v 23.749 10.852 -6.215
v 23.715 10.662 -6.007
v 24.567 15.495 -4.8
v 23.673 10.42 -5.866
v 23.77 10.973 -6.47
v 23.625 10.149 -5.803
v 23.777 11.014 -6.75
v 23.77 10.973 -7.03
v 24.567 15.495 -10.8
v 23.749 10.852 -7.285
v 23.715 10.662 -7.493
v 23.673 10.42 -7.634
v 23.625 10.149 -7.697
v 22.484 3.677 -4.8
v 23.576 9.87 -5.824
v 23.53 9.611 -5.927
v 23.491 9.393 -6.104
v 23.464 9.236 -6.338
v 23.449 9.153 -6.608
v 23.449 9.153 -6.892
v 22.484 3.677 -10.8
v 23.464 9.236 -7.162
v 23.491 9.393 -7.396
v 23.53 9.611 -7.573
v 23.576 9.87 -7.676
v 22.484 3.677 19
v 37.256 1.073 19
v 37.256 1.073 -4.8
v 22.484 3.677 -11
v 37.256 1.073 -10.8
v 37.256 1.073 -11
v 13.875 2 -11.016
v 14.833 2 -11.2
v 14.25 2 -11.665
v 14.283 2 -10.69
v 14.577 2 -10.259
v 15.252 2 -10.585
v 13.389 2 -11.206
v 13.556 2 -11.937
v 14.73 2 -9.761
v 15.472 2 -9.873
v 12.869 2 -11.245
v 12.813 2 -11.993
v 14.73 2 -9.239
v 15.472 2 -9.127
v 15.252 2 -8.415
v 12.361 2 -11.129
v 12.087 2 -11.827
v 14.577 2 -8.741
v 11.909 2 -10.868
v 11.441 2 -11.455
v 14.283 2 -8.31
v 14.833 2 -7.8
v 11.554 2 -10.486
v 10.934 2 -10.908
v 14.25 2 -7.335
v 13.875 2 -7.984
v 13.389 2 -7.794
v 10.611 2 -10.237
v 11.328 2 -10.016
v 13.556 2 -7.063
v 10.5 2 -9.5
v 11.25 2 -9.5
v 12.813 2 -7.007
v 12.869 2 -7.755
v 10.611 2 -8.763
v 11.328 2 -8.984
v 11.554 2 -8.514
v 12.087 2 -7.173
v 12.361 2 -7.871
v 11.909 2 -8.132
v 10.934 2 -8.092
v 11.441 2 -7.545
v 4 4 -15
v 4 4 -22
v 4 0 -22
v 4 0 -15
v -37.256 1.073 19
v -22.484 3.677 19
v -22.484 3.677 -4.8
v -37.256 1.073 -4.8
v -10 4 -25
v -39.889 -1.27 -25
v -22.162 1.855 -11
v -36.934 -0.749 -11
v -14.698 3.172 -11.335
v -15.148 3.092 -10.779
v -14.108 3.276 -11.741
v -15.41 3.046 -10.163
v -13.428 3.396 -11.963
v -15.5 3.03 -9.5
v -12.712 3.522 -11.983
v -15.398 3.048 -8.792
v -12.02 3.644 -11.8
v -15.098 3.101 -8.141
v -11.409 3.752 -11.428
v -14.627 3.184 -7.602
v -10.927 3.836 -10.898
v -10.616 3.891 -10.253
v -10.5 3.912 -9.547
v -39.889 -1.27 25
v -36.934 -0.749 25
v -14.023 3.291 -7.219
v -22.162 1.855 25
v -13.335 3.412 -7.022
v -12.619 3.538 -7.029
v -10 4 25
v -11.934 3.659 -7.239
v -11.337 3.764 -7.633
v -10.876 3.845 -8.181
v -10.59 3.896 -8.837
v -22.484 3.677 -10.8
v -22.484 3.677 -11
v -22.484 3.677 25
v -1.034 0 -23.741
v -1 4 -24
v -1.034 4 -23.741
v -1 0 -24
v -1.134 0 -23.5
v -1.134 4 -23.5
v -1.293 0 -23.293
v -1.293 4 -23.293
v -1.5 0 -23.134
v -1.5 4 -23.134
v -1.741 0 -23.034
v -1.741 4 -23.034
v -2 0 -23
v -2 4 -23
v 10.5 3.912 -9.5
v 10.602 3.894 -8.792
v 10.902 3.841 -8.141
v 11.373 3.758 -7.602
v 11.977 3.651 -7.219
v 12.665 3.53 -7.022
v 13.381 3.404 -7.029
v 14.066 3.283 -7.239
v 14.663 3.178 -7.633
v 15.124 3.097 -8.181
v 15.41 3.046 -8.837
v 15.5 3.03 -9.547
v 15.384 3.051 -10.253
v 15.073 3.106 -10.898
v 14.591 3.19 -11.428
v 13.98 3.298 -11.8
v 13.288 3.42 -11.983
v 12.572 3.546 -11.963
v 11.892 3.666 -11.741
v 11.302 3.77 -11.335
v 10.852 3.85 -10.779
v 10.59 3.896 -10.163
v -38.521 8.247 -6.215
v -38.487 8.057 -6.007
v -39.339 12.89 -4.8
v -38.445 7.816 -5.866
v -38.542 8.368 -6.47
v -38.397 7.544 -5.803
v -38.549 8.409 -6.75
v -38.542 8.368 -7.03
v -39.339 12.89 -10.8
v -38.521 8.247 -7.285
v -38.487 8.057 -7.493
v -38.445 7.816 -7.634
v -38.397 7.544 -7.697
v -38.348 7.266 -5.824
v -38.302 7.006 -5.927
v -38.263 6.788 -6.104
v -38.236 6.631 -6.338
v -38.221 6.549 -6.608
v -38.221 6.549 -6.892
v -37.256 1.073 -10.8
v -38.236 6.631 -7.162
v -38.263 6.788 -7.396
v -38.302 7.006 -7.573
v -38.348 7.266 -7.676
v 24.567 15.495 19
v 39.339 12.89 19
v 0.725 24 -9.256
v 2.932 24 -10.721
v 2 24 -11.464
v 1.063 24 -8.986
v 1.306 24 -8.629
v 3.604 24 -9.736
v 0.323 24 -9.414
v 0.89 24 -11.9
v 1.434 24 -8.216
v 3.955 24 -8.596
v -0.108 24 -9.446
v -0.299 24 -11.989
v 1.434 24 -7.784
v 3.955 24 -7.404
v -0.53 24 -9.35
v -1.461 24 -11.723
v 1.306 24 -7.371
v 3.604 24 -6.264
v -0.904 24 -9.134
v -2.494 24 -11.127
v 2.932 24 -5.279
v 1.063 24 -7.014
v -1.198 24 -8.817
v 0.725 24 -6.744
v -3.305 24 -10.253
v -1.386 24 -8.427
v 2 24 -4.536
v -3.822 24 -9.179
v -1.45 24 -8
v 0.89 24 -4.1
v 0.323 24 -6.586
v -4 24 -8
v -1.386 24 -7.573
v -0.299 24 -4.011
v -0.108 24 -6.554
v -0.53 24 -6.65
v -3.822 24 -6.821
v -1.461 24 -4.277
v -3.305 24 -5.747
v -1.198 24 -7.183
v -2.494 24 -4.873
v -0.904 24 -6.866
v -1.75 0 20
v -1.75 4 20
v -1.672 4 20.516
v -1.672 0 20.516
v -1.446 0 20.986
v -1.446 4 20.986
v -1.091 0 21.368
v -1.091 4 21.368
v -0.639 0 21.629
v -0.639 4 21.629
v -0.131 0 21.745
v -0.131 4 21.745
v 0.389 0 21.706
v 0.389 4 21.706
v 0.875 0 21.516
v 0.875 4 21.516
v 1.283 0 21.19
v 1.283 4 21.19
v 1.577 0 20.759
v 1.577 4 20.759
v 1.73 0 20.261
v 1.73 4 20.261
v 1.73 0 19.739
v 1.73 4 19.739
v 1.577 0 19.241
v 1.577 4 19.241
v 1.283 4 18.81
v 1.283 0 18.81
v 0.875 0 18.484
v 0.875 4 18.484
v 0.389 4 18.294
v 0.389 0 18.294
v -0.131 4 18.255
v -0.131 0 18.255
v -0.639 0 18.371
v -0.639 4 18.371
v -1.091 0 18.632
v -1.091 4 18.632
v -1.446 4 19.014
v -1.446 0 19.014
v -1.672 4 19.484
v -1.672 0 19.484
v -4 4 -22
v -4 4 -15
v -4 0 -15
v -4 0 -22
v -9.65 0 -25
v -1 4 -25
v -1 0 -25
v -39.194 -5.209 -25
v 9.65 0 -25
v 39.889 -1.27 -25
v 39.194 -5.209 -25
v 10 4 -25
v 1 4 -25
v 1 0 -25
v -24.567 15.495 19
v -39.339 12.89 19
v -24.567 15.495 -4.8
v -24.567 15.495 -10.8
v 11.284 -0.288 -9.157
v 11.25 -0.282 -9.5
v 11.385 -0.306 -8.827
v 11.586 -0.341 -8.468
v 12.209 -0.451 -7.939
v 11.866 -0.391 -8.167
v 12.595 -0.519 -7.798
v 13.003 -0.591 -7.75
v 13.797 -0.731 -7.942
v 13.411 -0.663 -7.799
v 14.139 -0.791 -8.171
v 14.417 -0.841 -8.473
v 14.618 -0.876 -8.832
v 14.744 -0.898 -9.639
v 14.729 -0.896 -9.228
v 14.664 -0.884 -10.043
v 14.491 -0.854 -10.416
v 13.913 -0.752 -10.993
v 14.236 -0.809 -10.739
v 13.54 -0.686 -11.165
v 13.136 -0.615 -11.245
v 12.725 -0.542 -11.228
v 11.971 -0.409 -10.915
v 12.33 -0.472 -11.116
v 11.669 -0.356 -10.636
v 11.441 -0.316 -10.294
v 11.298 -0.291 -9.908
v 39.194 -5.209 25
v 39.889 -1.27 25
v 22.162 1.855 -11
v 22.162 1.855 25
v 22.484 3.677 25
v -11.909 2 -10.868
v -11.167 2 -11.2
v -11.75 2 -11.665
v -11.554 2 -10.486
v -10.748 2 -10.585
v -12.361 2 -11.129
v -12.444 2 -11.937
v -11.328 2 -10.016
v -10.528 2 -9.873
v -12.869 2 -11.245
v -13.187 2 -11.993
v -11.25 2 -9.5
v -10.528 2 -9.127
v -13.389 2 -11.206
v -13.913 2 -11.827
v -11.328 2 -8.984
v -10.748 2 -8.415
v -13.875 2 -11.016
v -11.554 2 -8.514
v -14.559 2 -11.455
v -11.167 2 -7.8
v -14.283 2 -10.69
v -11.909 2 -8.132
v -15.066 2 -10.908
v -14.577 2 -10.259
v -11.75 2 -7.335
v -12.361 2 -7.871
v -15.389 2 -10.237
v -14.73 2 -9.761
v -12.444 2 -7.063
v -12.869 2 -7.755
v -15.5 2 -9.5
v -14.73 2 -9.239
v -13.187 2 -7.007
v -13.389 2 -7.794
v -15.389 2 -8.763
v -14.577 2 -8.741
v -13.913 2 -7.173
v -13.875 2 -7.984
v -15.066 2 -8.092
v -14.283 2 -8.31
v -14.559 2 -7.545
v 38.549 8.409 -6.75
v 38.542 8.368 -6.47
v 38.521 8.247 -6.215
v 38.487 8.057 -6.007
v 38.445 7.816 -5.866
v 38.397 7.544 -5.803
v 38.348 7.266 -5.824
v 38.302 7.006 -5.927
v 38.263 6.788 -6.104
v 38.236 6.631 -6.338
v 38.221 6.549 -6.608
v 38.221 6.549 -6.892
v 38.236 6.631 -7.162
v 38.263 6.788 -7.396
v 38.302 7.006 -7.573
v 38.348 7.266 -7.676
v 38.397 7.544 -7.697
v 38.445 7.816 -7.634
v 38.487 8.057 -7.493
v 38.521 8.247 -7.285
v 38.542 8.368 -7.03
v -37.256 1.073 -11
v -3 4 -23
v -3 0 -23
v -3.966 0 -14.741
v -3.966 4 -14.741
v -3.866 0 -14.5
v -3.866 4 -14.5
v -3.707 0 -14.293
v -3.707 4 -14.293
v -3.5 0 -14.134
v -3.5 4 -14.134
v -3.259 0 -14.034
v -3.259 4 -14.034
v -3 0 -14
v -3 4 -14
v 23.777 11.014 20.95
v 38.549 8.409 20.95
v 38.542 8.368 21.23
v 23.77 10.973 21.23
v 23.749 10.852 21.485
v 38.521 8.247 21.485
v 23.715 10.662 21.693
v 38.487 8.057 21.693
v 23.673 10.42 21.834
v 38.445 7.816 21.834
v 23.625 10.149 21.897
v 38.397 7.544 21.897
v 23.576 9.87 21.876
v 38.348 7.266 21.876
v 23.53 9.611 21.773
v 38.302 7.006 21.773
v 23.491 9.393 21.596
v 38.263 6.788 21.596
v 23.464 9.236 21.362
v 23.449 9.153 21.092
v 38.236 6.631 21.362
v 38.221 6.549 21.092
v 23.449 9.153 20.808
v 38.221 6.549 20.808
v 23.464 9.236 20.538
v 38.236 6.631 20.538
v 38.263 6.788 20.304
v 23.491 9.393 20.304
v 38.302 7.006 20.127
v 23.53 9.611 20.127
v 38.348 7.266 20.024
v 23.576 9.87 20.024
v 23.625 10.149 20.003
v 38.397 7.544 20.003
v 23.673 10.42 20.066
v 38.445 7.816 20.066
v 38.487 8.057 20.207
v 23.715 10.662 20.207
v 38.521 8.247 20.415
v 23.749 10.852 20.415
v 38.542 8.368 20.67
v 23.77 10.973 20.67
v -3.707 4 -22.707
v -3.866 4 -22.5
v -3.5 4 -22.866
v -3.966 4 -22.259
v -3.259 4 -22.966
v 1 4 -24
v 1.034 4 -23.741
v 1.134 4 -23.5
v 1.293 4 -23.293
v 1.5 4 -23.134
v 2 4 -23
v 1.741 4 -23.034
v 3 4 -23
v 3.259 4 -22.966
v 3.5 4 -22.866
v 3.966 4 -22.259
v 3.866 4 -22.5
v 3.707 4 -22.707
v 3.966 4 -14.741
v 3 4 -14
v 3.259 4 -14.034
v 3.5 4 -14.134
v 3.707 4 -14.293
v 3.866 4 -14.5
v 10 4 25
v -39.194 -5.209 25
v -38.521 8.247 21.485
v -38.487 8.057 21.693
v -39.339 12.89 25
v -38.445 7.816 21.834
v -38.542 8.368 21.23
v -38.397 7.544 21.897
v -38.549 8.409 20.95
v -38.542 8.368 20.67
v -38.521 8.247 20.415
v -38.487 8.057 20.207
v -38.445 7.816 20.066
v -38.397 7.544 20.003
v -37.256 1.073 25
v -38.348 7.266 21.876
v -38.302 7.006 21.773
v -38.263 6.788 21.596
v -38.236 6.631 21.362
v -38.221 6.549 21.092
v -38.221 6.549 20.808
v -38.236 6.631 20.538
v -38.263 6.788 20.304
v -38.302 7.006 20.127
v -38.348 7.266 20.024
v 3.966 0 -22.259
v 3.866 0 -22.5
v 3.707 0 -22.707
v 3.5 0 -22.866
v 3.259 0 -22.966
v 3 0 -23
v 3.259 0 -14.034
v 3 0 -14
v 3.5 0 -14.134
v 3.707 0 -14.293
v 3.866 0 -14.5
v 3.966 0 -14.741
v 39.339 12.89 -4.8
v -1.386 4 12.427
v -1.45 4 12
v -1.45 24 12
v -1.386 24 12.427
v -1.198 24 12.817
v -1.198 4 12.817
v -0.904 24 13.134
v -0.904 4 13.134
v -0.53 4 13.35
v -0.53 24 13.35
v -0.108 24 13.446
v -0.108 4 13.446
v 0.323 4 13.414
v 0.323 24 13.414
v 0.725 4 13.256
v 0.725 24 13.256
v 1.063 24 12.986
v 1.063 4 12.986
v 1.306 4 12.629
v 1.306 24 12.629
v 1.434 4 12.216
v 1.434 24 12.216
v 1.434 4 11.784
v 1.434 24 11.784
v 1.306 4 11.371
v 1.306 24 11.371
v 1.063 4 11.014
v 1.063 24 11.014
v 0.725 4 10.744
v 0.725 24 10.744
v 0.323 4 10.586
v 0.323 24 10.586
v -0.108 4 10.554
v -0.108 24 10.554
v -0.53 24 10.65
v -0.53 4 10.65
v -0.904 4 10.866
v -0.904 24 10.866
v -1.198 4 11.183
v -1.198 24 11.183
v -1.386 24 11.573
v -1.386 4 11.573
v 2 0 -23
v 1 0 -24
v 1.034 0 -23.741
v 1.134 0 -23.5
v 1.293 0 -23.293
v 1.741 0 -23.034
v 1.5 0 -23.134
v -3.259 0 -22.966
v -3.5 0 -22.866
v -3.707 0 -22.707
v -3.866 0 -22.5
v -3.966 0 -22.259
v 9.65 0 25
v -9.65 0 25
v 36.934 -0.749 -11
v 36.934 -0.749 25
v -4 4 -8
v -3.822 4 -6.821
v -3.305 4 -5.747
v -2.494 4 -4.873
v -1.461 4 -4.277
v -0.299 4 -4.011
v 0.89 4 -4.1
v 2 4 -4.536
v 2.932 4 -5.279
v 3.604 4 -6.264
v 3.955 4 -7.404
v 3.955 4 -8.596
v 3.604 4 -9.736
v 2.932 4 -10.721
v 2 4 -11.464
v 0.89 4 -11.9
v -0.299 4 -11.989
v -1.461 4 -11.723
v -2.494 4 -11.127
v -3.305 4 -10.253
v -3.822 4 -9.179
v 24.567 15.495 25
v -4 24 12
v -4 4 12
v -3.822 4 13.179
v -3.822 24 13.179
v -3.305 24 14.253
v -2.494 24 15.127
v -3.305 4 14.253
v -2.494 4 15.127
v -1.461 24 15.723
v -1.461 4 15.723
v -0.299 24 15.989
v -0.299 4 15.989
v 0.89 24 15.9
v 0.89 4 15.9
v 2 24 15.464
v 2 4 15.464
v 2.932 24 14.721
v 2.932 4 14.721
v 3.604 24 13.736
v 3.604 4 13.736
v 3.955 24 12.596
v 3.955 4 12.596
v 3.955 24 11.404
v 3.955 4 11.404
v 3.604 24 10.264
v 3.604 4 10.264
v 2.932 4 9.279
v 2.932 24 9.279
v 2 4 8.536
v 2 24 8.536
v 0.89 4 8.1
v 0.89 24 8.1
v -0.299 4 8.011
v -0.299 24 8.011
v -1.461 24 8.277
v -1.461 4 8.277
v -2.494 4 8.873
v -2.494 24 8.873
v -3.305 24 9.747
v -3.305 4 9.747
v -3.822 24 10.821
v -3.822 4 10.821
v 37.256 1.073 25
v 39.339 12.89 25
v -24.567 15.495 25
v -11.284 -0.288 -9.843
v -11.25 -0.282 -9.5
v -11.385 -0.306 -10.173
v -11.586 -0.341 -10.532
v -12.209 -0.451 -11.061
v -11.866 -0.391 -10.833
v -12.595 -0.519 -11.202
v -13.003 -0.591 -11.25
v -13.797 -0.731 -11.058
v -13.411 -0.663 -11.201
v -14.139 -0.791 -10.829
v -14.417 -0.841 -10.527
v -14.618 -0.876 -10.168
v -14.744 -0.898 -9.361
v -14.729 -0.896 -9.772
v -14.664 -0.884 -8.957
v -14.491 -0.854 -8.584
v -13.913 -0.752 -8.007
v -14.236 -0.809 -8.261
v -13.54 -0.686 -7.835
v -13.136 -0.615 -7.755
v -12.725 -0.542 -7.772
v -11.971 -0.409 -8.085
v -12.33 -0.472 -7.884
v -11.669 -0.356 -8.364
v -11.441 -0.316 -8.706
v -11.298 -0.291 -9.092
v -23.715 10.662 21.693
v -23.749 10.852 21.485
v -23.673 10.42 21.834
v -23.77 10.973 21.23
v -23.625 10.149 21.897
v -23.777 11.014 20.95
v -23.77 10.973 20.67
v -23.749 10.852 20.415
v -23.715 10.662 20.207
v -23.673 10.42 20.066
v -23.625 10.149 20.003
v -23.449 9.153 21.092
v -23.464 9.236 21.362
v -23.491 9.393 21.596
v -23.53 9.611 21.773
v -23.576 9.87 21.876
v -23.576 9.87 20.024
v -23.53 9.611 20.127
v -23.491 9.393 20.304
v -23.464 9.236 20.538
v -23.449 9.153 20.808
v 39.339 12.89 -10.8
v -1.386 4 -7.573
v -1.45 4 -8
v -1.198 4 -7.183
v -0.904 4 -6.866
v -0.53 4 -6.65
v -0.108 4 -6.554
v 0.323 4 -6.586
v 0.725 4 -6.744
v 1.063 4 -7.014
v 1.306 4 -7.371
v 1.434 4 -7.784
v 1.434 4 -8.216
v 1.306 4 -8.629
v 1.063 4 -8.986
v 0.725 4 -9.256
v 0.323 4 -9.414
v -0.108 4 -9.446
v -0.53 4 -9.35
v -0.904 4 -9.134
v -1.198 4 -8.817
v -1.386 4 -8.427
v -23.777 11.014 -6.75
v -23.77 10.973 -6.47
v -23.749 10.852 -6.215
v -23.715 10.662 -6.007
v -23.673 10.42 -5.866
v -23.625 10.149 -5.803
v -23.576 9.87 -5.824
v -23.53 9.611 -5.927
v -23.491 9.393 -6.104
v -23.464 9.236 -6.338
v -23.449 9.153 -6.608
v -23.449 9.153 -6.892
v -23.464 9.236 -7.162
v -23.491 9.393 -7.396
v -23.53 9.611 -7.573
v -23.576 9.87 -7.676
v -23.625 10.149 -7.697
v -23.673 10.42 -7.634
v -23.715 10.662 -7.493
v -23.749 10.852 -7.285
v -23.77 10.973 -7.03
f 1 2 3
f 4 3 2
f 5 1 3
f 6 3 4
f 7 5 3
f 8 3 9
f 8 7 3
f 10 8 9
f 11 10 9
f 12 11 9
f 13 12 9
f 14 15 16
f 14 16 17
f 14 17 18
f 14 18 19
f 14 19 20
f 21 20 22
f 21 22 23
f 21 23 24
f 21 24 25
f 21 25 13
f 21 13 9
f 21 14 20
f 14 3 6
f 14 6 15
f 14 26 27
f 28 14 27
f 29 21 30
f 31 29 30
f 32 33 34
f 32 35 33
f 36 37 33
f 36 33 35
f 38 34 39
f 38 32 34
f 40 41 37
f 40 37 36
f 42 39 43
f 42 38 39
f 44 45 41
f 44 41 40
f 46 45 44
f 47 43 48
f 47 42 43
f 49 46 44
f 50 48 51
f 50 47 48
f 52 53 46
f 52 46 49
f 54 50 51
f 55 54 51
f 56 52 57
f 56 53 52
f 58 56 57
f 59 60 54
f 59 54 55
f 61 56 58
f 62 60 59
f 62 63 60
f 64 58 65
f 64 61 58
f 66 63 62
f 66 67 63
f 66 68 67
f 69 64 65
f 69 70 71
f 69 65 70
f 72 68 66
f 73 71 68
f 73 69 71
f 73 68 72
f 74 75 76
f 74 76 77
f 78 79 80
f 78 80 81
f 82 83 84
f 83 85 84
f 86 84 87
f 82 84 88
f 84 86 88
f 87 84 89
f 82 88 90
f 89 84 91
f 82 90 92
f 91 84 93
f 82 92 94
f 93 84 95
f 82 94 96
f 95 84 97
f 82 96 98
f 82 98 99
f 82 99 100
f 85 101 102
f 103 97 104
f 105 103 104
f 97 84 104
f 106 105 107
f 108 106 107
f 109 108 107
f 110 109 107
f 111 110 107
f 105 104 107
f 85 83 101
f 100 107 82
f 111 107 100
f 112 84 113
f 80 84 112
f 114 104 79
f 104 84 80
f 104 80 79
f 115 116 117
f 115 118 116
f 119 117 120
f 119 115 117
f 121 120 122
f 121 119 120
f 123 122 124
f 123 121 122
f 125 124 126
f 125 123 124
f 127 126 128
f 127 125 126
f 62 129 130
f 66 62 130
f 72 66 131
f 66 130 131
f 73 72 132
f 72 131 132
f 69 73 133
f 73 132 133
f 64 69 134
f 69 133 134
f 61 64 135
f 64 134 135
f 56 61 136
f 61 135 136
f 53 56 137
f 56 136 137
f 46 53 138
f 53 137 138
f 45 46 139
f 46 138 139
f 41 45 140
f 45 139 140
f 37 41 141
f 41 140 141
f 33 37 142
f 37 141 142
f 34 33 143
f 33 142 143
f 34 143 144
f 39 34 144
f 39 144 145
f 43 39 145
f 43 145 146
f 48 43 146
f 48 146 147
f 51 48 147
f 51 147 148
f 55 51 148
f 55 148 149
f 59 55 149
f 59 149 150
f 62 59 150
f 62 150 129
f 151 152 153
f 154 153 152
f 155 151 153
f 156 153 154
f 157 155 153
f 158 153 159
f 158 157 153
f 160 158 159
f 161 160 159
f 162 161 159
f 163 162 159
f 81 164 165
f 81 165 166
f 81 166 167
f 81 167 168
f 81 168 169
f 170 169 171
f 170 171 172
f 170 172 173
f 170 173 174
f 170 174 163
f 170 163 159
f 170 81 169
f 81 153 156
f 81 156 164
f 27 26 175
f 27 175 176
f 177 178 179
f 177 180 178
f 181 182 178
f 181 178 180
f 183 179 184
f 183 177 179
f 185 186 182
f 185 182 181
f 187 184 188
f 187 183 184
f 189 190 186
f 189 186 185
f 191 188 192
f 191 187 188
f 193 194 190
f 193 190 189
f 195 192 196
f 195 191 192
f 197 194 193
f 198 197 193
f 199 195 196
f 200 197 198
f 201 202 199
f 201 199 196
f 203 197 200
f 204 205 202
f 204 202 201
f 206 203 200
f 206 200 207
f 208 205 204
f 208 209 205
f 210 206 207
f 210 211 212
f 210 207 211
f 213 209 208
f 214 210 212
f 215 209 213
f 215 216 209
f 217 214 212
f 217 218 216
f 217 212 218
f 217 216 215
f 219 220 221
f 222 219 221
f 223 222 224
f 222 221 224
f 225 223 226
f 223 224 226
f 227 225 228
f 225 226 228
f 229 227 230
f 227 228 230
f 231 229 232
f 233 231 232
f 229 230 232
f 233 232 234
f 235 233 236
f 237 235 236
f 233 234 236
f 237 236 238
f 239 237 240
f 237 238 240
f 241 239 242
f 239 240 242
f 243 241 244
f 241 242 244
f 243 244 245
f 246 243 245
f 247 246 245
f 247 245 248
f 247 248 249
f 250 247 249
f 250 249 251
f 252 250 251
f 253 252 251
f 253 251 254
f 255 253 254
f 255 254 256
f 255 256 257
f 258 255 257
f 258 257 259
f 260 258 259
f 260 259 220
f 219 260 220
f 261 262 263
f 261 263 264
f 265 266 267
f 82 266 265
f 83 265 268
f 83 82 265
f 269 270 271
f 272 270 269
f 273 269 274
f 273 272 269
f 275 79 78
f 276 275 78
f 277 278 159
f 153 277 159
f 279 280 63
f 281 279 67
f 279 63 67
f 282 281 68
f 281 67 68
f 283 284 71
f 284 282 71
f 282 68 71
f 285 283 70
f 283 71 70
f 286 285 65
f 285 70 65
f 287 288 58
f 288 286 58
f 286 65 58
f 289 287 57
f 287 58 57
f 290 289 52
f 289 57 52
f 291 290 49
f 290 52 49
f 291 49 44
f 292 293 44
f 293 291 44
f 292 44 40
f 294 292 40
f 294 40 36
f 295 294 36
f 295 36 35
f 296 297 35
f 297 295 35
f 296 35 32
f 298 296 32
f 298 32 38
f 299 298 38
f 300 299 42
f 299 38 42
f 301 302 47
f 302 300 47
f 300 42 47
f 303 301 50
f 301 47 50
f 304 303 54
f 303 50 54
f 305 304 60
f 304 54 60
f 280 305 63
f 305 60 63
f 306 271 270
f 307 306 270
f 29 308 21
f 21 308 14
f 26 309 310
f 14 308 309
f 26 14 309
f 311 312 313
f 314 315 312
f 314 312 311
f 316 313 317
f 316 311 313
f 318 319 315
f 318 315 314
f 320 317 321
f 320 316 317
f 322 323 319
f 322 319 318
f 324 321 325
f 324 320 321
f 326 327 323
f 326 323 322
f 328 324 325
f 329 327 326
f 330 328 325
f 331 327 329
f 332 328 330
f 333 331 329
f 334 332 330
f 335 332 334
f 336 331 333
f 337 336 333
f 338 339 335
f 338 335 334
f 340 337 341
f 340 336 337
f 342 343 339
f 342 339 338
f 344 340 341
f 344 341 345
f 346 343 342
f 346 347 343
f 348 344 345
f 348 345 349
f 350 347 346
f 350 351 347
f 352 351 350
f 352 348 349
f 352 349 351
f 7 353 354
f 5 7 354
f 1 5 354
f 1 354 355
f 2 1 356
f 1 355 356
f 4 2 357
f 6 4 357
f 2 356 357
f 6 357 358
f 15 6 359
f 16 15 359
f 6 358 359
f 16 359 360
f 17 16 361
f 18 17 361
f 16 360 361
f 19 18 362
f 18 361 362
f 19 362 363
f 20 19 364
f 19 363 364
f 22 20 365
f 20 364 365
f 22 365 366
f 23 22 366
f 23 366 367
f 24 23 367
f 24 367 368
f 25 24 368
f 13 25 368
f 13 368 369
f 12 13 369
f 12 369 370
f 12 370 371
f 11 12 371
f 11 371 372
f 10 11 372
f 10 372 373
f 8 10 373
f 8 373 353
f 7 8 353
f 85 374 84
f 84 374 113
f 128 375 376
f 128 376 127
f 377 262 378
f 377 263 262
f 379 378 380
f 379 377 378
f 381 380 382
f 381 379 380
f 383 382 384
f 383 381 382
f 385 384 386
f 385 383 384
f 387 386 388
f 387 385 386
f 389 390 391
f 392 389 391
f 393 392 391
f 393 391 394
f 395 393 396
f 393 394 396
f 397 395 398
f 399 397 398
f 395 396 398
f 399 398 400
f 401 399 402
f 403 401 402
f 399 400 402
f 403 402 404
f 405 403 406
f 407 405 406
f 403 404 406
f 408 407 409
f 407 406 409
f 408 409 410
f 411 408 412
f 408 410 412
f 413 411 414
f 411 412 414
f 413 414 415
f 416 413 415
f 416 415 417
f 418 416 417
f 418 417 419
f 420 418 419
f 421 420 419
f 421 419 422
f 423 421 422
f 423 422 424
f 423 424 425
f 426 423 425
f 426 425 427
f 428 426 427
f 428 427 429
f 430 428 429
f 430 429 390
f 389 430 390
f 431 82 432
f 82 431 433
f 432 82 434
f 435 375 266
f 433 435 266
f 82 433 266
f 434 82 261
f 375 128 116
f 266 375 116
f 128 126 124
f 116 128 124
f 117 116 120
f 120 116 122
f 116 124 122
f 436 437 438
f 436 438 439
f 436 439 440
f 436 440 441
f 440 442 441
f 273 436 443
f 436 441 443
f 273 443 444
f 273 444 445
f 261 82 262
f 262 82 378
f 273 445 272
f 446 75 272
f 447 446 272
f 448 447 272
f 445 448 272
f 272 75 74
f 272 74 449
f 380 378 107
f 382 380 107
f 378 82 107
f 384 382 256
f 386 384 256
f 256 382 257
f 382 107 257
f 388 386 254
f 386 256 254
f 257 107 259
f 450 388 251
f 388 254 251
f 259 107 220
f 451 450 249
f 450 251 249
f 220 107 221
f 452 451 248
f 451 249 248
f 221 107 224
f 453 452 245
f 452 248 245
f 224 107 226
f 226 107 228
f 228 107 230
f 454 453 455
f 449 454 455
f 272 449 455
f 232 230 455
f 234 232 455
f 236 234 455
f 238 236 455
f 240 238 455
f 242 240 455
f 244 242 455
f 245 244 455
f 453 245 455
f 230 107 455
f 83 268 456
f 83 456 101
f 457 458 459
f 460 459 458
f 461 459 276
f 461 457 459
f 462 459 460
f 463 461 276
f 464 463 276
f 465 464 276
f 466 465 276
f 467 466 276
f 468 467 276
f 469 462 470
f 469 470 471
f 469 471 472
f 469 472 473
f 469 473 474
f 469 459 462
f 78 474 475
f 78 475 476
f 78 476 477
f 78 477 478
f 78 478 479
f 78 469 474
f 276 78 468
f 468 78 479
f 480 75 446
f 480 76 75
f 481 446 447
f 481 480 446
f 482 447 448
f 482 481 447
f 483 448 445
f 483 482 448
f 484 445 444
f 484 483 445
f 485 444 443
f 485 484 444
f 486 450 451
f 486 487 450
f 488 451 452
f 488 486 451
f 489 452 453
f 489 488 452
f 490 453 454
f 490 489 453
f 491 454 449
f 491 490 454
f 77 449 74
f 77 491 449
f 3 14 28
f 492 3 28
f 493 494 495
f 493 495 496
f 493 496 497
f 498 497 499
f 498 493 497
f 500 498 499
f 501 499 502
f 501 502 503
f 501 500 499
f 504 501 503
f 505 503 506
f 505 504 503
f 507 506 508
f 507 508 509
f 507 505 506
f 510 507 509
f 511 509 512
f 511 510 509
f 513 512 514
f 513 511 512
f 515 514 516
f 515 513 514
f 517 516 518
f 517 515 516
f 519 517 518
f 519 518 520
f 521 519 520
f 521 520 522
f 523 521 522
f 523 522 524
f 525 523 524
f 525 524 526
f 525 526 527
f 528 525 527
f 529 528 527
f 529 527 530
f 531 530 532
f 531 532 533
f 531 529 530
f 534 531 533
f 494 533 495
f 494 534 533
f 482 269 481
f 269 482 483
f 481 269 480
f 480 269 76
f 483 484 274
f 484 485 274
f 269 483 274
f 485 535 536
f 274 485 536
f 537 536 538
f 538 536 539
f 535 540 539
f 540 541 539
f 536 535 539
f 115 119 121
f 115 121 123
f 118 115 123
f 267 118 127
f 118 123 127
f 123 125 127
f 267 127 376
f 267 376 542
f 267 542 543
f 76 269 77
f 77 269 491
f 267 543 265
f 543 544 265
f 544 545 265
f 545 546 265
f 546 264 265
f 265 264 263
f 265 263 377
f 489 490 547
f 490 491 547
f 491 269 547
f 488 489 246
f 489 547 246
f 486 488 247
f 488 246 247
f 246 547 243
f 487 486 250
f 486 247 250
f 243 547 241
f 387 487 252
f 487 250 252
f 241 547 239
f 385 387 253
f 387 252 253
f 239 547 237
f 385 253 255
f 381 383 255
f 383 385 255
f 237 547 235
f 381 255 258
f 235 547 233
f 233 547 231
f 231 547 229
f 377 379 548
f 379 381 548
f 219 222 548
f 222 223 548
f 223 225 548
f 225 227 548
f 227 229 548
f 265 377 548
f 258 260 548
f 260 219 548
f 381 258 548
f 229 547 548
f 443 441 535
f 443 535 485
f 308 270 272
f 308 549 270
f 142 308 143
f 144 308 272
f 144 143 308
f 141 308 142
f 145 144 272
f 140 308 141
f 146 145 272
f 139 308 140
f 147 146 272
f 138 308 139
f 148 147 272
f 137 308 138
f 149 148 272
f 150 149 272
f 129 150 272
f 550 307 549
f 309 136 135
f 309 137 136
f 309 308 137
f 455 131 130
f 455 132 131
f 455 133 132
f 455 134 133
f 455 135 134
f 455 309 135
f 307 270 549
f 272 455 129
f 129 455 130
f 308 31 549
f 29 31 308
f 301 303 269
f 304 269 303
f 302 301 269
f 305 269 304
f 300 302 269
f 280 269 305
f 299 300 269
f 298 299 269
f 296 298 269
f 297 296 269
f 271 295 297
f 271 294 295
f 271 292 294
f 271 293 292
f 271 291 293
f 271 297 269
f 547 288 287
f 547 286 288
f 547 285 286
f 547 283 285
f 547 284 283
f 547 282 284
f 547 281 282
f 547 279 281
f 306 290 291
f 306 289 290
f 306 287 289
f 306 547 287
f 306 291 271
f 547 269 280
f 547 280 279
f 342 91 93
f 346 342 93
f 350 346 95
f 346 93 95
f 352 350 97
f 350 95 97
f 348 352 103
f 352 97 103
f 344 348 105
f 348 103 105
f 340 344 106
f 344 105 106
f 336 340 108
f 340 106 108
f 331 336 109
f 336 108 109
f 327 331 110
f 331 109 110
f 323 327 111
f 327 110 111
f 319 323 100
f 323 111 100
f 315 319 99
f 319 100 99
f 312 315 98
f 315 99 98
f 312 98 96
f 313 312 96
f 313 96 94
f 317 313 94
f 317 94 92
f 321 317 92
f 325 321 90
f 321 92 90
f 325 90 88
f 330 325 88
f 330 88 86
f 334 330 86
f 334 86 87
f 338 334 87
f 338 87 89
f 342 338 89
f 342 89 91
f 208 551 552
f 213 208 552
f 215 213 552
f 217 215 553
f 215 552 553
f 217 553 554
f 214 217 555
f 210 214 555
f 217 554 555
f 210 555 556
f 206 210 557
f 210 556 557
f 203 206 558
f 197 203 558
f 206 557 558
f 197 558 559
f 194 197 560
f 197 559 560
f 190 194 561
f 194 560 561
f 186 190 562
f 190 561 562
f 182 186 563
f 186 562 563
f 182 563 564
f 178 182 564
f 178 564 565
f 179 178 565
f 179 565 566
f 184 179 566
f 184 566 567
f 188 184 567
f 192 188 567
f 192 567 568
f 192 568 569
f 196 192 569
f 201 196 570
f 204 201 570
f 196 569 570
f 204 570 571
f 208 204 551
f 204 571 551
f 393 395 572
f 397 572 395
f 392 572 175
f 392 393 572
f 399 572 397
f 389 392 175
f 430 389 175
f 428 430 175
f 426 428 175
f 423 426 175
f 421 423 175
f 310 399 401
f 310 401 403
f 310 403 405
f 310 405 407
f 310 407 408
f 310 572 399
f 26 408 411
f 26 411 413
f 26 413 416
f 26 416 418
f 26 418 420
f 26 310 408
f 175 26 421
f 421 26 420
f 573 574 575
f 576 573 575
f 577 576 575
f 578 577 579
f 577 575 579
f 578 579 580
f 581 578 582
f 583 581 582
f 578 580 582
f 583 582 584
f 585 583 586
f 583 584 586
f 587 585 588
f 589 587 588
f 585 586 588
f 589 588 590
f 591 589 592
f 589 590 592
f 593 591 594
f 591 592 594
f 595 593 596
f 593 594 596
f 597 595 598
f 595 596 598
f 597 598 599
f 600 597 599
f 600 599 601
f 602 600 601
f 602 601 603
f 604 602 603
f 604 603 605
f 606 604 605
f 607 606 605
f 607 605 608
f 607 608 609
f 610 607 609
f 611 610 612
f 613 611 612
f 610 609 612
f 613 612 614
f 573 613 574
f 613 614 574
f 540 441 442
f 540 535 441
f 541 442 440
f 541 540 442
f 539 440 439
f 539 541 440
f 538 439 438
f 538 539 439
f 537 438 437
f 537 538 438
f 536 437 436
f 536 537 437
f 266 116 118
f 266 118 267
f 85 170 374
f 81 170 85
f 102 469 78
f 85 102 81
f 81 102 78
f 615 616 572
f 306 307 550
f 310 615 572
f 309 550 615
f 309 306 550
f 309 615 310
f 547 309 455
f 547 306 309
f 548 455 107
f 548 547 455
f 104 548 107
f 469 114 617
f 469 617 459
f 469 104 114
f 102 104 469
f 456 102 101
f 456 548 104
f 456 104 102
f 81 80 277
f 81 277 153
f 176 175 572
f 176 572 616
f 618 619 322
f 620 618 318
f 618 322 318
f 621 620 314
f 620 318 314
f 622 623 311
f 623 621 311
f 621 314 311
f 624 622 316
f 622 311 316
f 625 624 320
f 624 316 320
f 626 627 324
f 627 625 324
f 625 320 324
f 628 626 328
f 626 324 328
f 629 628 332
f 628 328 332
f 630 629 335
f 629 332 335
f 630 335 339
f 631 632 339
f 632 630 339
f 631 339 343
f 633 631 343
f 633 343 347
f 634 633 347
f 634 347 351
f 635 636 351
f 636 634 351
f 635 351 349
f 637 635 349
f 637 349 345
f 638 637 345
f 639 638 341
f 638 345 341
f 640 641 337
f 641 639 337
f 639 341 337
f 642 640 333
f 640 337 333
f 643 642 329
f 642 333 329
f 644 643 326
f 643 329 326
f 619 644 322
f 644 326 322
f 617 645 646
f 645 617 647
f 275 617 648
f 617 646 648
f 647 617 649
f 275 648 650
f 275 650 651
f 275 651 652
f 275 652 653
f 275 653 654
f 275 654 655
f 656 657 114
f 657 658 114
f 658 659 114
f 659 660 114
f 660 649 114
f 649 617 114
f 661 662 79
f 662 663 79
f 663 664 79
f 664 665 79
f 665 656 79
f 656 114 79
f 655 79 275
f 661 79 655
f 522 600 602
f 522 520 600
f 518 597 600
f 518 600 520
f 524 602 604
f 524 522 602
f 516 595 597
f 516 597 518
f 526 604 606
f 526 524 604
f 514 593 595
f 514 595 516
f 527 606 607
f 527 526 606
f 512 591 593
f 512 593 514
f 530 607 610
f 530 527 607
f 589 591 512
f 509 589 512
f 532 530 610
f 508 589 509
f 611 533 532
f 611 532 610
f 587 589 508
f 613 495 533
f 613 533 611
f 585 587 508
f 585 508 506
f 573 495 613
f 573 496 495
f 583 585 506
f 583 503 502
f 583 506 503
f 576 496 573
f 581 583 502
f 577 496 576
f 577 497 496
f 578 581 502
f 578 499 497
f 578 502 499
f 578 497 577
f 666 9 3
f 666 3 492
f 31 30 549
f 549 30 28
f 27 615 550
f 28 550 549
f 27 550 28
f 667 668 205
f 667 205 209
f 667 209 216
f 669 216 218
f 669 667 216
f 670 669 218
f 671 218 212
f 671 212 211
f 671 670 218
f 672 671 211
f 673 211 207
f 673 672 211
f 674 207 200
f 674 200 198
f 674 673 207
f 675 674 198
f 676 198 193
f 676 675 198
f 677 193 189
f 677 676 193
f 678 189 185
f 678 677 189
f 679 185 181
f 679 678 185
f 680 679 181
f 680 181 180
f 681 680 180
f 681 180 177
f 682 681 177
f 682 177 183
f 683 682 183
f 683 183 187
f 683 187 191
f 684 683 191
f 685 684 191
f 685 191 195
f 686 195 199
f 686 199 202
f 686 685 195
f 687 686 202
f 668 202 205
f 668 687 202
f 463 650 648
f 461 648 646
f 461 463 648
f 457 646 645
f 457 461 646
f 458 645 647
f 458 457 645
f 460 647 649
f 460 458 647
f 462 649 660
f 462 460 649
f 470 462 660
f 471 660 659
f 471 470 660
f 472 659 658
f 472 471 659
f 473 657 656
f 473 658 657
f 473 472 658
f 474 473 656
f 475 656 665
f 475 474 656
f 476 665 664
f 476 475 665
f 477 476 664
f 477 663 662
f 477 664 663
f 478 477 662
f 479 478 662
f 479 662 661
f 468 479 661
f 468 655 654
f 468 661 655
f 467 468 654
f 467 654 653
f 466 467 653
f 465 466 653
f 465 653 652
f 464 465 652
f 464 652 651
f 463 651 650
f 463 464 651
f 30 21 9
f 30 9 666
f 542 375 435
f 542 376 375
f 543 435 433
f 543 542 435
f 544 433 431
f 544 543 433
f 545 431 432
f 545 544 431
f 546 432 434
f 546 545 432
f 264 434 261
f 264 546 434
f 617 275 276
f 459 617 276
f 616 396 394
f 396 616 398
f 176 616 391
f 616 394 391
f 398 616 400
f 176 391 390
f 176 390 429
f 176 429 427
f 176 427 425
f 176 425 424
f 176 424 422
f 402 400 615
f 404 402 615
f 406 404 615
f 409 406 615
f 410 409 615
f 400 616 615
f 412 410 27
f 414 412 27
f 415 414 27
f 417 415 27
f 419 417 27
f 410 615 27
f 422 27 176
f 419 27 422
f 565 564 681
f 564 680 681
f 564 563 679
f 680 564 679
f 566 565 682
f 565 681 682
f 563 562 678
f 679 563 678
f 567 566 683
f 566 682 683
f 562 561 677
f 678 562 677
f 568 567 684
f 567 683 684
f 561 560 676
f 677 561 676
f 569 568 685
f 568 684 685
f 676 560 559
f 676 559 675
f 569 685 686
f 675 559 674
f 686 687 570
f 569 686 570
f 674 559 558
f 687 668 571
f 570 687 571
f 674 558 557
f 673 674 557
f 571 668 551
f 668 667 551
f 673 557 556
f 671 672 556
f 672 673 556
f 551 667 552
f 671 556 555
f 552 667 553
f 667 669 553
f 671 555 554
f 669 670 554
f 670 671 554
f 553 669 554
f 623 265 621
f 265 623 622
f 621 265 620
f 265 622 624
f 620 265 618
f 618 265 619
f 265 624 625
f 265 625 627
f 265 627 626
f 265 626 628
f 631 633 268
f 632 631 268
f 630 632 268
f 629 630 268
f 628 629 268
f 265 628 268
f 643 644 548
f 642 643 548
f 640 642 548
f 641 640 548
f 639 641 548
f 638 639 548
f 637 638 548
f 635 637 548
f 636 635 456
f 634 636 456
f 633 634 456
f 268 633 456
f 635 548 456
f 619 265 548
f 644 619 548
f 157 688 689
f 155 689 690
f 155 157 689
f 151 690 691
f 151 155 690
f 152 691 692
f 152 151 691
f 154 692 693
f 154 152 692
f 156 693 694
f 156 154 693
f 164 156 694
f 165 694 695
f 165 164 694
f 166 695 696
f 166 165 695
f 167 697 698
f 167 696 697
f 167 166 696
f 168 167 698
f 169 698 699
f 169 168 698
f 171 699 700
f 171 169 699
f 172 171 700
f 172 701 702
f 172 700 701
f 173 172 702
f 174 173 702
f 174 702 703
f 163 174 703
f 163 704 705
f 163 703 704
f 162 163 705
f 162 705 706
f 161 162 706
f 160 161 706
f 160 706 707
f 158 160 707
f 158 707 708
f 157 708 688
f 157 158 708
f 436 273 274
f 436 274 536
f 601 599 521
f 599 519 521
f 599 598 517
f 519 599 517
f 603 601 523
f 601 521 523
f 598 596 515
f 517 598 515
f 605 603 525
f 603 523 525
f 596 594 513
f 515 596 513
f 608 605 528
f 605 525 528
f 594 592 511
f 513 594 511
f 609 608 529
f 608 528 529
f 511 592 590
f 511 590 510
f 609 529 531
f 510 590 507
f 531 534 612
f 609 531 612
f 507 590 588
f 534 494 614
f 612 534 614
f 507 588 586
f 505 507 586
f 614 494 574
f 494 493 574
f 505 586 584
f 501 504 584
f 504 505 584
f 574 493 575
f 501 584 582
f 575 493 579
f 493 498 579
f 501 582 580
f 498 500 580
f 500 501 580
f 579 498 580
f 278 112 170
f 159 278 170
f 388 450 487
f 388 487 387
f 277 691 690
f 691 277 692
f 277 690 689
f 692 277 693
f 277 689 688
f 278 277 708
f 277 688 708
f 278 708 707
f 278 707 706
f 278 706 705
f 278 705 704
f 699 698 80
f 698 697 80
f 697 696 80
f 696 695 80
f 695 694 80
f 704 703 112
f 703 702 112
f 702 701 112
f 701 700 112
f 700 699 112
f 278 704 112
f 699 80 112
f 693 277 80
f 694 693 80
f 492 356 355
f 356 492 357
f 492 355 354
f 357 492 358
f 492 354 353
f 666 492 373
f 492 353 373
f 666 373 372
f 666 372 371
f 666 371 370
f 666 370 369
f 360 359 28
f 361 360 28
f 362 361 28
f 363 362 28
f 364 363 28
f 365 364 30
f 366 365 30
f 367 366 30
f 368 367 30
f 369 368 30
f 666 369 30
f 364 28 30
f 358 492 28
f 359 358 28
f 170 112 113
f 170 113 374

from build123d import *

# Parameters (mm, degrees)
EXTRUDE_1_DEPTH     = 25
EXTRUDE_2_DEPTH     = 36
SKETCH_3_W          = 15
SKETCH_3_H          = 6
EXTRUDE_3_DEPTH     = 12
SKETCH_4_R          = 0.95
CUT_EXTRUDE_1_DEPTH = 21
SKETCH_5_R          = 4
SKETCH_5_R_2        = 1.45
EXTRUDE_4_DEPTH     = 20
EXTRUDE_4_2_DEPTH   = 20
SKETCH_6_R          = 1.75
CUT_EXTRUDE_2_DEPTH = 20
SKETCH_7_R          = 2.5
CUT_EXTRUDE_3_DEPTH = 2
CUT_EXTRUDE_4_DEPTH = 52.148040055
FILLET_4_R          = 1


with BuildPart() as part:
    # 草图1 → 凸台-拉伸1 (new, symmetric)
    with BuildSketch(Plane.XY):
        Polygon((0, 0), (9.650045346, 0), (39.194277936, -5.20944533), (39.888870647, -1.270214318), (10, 4), (0, 4), align=None)
    extrude_1 = extrude(amount=EXTRUDE_1_DEPTH, both=True)

    # 草图2 → 凸台-拉伸2 (add)
    with BuildSketch(Plane.XY.offset(25)):
        Polygon((22.162331093, 1.85545288), (22.483580221, 3.677347223), (37.255696517, 1.072624558), (36.934447388, -0.749269785), align=None)
    extrude_2 = extrude(amount=-EXTRUDE_2_DEPTH)

    # 草图3 → 凸台-拉伸3 (add)
    with BuildSketch(Plane(origin=(1.306826311, 7.411380301, 0), x_dir=(0.9848077530122079, -0.1736481776669312, 0), z_dir=(0.1736481776669312, 0.9848077530122079, 0))):
        with Locations((29.003439474, -22)):
            Rectangle(SKETCH_3_W, SKETCH_3_H)
        with Locations((29.003439474, 7.8)):
            Rectangle(SKETCH_3_W, SKETCH_3_H)
    extrude_3 = extrude(amount=EXTRUDE_3_DEPTH)

    # 草图4 → 切除-拉伸1 (cut)
    with BuildSketch(Plane(origin=(35.948870205, -6.338755743, 0), x_dir=(0, 0, -1), z_dir=(0.9848077530122081, -0.17364817766693072, 0))):
        with Locations(Location((-20.95, 14.025712789, 0), (0, 0, 90))):
            Circle(SKETCH_4_R)
        with Locations(Location((6.75, 14.025712789, 0), (0, 0, 90))):
            Circle(SKETCH_4_R)
    cut_extrude_1 = extrude(amount=-CUT_EXTRUDE_1_DEPTH, mode=Mode.SUBTRACT)

    # 镜向1: 凸台-拉伸1, 凸台-拉伸2, 凸台-拉伸3, 切除-拉伸1 across plane
    add(extrude_1.mirror(Plane(origin=(0, 0, 0), x_dir=(0, 0, 1), z_dir=(1, 0, 0))))
    add(extrude_2.mirror(Plane(origin=(0, 0, 0), x_dir=(0, 0, 1), z_dir=(1, 0, 0))))
    add(extrude_3.mirror(Plane(origin=(0, 0, 0), x_dir=(0, 0, 1), z_dir=(1, 0, 0))))
    add(cut_extrude_1.mirror(Plane(origin=(0, 0, 0), x_dir=(0, 0, 1), z_dir=(1, 0, 0))), mode=Mode.SUBTRACT)

    # 草图6 → 切除-拉伸2 (cut)
    with BuildSketch(Plane(origin=(0, 4, 0), x_dir=(1, 0, 0), z_dir=(0, 1, 0))):
        with Locations(Location((0, -20, 0), (0, 0, 180))):
            Circle(SKETCH_6_R)
        with Locations((-13, 9.5)):
            Circle(SKETCH_6_R)
        with Locations(Location((13, 9.5, 0), (0, 0, 180))):
            Circle(SKETCH_6_R)
    extrude(amount=-CUT_EXTRUDE_2_DEPTH, mode=Mode.SUBTRACT)

    # 草图7 → 切除-拉伸3 (cut)
    with BuildSketch(Plane(origin=(0, 4, 0), x_dir=(1, 0, 0), z_dir=(0, 1, 0))):
        with Locations(Location((-13, 9.5, 0), (0, 0, 180))):
            Circle(SKETCH_7_R)
        with Locations(Location((13, 9.5, 0), (0, 0, 180))):
            Circle(SKETCH_7_R)
    extrude(amount=-CUT_EXTRUDE_3_DEPTH, mode=Mode.SUBTRACT)

    # 草图8 → 切除-拉伸4 (cut, through all)
    with BuildSketch(Plane(origin=(0, 4, 0), x_dir=(1, 0, 0), z_dir=(0, 1, 0))):
        Polygon((-4, 23), (-1, 23), (-1, 25), (1, 25), (1, 23), (4, 23), (4, 14), (-4, 14), align=None)
    extrude(amount=-CUT_EXTRUDE_4_DEPTH, mode=Mode.SUBTRACT)

    # 圆角4
    fillet_4_edges = [part.edges().sort_by_distance(p)[0] for p in [
        (4, 2, -23),
        (4, 2, -14),
        (-4, 2, -14),
        (-4, 2, -23),
        (1, 2, -23),
        (-1, 2, -23),
    ]]
    fillet(fillet_4_edges, radius=FILLET_4_R)


with BuildPart() as body_2:
    # 草图5 → 凸台-拉伸4 (new body)
    with BuildSketch(Plane(origin=(0, 4, 0), x_dir=(1, 0, 0), z_dir=(0, 1, 0))):
        with Locations(Location((0, -12, 0), (0, 0, 180))):
            Circle(SKETCH_5_R)
        with Locations(Location((0, -12, 0), (0, 0, 180))):
            Circle(SKETCH_5_R_2, mode=Mode.SUBTRACT)
    extrude(amount=EXTRUDE_4_DEPTH)


with BuildPart() as body_3:
    # 草图5 → Extrude 4 2 (new body)
    with BuildSketch(Plane(origin=(0, 4, 0), x_dir=(1, 0, 0), z_dir=(0, 1, 0))):
        with Locations(Location((0, 8, 0), (0, 0, 180))):
            Circle(SKETCH_5_R)
        with Locations(Location((0, 8, 0), (0, 0, 180))):
            Circle(SKETCH_5_R_2, mode=Mode.SUBTRACT)
    extrude(amount=EXTRUDE_4_2_DEPTH)


solid = Compound([part.part, body_2.part, body_3.part])
